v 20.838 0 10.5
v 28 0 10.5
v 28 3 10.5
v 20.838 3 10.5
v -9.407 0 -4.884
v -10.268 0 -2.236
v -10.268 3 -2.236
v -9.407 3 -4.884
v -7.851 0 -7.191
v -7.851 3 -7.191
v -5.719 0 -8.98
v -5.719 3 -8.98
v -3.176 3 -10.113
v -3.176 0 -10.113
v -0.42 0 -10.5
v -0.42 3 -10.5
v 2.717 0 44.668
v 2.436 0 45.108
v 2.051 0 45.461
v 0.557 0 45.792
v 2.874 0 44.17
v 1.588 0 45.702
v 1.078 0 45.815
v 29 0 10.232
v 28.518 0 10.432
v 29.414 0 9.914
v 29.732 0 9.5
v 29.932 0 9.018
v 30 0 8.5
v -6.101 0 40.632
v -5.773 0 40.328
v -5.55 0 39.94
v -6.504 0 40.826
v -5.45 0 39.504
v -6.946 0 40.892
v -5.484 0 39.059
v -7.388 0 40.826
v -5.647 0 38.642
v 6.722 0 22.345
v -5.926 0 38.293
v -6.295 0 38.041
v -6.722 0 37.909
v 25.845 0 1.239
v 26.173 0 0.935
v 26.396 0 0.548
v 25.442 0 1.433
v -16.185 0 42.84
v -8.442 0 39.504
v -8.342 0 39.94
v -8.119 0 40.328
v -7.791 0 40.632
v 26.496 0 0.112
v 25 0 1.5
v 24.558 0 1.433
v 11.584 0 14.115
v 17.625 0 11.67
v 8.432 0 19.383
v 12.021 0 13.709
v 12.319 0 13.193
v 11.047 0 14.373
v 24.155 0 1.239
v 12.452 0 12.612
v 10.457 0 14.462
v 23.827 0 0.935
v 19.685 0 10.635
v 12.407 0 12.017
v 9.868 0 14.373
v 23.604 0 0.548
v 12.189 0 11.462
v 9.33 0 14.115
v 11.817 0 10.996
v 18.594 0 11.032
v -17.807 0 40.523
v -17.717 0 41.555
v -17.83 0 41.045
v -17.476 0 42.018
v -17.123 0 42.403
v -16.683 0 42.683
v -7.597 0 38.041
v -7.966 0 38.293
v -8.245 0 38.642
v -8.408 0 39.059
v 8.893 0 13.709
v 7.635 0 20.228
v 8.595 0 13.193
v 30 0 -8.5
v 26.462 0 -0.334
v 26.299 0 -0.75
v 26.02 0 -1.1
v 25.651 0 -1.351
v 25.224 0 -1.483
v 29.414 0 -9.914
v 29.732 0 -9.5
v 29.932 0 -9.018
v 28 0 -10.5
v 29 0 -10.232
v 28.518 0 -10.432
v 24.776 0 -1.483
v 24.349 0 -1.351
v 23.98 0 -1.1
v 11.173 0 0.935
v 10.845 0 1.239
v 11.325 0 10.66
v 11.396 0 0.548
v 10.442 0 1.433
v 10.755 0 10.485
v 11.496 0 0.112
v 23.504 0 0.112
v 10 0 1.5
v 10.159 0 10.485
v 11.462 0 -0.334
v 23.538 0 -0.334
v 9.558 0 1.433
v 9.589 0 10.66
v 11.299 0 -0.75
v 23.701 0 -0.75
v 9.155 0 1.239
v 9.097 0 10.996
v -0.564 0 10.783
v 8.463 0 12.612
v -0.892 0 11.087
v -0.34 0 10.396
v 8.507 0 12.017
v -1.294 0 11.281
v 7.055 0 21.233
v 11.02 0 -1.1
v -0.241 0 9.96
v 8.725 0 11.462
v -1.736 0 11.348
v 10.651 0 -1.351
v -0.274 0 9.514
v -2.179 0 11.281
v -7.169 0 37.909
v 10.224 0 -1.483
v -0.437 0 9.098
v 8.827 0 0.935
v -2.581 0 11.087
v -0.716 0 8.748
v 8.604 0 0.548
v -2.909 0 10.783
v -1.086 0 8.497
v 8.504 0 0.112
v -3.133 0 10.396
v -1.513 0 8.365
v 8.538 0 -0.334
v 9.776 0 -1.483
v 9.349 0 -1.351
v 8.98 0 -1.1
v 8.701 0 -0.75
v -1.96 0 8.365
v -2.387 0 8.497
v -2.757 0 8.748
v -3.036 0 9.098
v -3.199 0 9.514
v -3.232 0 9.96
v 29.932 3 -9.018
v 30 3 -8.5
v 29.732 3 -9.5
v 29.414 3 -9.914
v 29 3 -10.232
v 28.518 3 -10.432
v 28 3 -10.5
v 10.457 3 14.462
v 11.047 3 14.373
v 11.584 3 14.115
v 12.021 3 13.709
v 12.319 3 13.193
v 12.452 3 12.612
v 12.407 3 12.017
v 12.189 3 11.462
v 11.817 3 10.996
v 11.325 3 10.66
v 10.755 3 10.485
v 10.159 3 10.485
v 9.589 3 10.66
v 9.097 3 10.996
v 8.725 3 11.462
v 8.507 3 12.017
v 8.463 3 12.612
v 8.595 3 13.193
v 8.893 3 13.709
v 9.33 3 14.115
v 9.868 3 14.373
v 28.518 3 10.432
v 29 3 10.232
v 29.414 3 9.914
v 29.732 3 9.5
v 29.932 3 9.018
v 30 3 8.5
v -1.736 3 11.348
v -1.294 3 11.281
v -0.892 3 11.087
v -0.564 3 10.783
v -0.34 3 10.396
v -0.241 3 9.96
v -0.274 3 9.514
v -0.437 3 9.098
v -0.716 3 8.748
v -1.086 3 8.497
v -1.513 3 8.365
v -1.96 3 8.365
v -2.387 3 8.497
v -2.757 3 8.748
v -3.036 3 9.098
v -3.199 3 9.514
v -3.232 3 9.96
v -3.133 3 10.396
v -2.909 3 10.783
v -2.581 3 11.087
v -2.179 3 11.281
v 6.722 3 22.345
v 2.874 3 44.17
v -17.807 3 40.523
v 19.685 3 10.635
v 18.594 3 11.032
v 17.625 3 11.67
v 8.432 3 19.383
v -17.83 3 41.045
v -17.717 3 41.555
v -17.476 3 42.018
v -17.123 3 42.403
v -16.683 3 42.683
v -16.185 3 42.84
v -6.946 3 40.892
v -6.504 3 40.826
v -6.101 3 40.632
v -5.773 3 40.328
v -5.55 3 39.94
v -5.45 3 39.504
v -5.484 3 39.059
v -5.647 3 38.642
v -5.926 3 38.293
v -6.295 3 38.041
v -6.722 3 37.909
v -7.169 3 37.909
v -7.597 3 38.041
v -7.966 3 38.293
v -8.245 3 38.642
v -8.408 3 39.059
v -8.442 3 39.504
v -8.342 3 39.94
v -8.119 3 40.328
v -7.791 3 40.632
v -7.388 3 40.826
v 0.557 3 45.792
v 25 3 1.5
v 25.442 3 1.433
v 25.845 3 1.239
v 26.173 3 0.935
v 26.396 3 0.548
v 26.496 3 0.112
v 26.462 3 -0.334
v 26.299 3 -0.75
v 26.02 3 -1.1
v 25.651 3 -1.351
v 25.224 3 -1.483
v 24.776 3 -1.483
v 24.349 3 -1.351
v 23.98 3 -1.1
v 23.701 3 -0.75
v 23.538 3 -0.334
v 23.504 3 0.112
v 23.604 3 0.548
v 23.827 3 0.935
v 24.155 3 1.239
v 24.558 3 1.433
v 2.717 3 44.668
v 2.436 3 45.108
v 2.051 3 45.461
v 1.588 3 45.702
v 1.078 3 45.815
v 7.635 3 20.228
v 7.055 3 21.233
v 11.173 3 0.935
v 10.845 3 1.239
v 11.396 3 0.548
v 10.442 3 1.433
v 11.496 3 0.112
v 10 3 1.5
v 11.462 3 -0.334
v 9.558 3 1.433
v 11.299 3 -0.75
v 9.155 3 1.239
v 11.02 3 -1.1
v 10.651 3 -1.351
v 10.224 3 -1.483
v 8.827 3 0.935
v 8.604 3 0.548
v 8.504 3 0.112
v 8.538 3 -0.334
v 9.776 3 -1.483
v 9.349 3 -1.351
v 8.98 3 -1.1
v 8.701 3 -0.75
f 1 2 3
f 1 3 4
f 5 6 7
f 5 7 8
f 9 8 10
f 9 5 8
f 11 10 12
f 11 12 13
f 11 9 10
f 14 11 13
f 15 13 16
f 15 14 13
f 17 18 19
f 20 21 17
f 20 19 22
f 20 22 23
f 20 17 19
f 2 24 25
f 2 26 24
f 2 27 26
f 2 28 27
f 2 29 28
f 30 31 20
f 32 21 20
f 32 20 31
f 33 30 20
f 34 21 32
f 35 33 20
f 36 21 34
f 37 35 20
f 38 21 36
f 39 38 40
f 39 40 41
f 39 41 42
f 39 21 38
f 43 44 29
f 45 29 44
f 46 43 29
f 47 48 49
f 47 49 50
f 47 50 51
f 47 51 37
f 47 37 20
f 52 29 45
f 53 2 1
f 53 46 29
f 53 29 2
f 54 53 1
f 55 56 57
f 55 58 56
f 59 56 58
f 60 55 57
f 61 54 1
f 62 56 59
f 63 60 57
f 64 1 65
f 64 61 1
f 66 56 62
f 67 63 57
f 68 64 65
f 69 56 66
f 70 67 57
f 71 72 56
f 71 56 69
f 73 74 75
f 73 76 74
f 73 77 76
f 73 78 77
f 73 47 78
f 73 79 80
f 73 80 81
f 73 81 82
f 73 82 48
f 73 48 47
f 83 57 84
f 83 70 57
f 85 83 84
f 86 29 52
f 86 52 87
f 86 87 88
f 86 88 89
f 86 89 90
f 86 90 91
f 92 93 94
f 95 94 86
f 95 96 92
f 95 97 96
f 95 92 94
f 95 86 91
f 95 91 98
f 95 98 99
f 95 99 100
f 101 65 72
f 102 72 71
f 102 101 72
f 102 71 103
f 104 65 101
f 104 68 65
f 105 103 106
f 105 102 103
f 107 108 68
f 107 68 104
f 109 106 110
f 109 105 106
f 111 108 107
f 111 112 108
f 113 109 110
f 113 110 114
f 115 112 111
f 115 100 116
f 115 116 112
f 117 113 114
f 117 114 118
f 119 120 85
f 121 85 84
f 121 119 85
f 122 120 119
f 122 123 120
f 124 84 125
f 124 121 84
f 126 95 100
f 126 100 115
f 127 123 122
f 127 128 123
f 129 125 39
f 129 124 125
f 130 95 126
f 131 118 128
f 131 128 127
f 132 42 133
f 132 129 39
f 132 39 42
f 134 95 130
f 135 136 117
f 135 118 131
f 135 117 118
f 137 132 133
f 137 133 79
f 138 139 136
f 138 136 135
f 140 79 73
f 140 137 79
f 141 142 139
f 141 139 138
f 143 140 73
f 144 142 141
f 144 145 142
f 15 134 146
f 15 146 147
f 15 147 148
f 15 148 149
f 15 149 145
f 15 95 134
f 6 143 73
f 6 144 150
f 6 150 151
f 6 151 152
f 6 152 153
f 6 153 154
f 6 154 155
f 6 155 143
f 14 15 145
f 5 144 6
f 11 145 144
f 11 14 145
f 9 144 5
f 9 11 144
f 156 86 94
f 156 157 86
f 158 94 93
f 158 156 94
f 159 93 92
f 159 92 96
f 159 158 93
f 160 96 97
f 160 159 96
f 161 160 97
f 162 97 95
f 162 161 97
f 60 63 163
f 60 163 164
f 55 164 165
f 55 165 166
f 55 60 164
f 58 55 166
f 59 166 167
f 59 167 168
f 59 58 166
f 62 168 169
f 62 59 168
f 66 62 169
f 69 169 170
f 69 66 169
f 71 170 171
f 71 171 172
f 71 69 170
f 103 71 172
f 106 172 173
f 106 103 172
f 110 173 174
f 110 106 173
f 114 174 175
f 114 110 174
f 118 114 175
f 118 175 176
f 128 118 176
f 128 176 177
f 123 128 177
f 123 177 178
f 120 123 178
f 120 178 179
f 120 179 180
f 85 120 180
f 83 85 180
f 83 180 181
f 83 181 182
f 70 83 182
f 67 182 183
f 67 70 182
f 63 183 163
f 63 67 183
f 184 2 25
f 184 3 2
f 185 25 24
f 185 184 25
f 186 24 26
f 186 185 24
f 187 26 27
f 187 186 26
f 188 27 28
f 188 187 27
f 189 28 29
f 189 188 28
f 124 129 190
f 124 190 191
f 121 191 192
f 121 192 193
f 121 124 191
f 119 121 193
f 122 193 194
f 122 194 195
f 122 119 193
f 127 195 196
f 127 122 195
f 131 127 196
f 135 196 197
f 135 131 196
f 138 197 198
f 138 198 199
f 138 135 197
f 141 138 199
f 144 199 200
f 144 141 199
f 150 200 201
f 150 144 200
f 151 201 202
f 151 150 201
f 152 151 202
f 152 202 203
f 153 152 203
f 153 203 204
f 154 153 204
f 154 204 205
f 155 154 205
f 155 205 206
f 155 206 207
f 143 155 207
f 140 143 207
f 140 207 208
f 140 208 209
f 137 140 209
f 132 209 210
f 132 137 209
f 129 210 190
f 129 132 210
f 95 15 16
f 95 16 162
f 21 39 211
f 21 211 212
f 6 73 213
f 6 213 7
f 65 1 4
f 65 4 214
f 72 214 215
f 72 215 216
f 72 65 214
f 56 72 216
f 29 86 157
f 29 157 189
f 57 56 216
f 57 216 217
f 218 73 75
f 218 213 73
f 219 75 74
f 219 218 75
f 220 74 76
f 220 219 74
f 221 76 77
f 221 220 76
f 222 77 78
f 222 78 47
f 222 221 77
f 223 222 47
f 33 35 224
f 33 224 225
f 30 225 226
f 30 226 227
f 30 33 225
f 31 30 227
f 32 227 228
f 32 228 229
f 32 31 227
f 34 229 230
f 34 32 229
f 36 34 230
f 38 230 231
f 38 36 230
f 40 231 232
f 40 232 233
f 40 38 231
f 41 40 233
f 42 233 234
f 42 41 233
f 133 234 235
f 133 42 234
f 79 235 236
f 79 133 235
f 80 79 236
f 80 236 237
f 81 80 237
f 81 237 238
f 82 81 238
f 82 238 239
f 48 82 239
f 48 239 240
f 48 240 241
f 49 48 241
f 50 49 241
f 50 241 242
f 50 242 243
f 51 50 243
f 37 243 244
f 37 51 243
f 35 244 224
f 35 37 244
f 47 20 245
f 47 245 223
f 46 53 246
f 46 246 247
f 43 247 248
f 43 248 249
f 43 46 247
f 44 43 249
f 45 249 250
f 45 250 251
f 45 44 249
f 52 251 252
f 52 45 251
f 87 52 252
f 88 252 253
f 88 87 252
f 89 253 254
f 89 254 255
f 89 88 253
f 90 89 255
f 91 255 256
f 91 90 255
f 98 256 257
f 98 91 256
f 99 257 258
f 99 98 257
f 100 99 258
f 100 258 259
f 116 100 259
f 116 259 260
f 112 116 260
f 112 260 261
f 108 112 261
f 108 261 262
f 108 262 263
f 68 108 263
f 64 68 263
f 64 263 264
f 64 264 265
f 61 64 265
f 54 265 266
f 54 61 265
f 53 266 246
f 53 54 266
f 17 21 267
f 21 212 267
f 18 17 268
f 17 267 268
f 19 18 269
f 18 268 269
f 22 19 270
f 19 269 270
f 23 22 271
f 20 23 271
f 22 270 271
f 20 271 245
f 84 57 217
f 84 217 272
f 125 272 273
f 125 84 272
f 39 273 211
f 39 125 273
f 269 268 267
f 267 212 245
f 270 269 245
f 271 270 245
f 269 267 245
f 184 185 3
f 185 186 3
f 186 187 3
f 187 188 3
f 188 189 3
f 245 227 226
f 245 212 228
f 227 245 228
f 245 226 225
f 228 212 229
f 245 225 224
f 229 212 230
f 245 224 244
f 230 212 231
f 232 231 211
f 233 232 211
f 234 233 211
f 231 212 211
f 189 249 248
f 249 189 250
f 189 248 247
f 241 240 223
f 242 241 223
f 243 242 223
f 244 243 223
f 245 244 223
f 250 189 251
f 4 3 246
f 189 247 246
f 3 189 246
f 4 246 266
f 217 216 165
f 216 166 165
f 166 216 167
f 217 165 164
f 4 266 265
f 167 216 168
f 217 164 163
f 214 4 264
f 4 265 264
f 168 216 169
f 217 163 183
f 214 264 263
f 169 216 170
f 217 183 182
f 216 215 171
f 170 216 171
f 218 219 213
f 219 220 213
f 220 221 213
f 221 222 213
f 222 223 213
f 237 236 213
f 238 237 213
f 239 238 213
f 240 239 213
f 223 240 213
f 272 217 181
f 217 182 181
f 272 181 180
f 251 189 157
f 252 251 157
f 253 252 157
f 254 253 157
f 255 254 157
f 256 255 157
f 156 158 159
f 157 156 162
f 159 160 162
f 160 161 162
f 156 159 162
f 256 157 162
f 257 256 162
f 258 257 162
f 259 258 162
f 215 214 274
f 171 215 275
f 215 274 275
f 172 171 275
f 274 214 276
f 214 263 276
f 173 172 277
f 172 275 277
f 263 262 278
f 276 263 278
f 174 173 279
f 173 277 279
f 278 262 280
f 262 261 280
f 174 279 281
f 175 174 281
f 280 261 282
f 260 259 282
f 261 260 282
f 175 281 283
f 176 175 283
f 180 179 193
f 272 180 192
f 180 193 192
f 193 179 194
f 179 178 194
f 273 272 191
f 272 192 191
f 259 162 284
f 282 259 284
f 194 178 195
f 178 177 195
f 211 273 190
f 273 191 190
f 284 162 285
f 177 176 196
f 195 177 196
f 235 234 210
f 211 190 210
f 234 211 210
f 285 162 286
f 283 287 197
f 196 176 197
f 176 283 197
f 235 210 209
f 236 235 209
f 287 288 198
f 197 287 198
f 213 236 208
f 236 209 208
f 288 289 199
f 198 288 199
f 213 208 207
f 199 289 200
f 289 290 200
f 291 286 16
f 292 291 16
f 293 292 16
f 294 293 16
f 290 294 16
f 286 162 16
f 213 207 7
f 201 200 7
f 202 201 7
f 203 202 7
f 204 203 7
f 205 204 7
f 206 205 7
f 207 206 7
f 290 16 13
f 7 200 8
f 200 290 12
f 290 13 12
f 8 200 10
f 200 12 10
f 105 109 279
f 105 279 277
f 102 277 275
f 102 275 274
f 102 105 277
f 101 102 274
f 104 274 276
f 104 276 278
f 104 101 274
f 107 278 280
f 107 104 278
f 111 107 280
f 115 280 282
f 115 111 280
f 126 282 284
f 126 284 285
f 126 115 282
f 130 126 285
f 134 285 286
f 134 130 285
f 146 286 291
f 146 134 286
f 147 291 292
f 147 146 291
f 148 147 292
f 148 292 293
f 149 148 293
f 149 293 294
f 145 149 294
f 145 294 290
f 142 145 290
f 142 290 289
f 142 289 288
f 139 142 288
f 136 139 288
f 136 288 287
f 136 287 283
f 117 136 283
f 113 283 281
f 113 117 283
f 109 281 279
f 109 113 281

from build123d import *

# Parameters (mm, degrees)
SKETCH_1_R      = 1.5
SKETCH_1_R_2    = 2
EXTRUDE_1_DEPTH = 3
FILLET_1_R      = 2


with BuildPart() as part:
    # 草图1 → 凸台-拉伸1 (new body)
    with BuildSketch(Plane(origin=(0, 0, 0), x_dir=(1, 0, 0), z_dir=(0, 1, 0))):
        with BuildLine():
            Line((30, -10.5), (20.838488019, -10.5))
            ThreePointArc((20.838488019, -10.5), (19.128387303, -10.801536896), (17.624549971, -11.669777784))
            Line((17.624549971, -11.669777784), (8.432016653, -19.383229101))
            ThreePointArc((8.432016653, -19.383229101), (7.315827683, -20.713451316), (6.721915937, -22.345210428))
            Line((6.721915937, -22.345210428), (2.526313412, -46.139654751))
            Line((2.526313412, -46.139654751), (-18.154649402, -42.49304302))
            Line((-18.154649402, -42.49304302), (-10.267627346, 2.236481777))
            ThreePointArc((-10.267627346, 2.236481777), (-6.847425912, 8.160444431), (-0.419549816, 10.5))
            Line((-0.419549816, 10.5), (30, 10.5))
            Line((30, 10.5), (30, -10.5))
        make_face()
        with Locations(Location((25, 0, 0), (0, 0, 270))):
            Circle(SKETCH_1_R, mode=Mode.SUBTRACT)
        with Locations(Location((10, 0, 0), (0, 0, 270))):
            Circle(SKETCH_1_R, mode=Mode.SUBTRACT)
        with Locations(Location((-6.945927107, -39.39231012, 0), (0, 0, 270))):
            Circle(SKETCH_1_R, mode=Mode.SUBTRACT)
        with Locations(Location((-1.736481777, -9.84807753, 0), (0, 0, 270))):
            Circle(SKETCH_1_R, mode=Mode.SUBTRACT)
        with Locations(Location((10.457132873, -12.46232567, 0), (0, 0, 270))):
            Circle(SKETCH_1_R_2, mode=Mode.SUBTRACT)
    extrude(amount=EXTRUDE_1_DEPTH)

    # 圆角1
    fillet_1_edges = [part.edges().sort_by_distance(p)[0] for p in [
        (2.526313412, 1.5, 46.139654751),
        (-18.154649402, 1.5, 42.49304302),
        (30, 1.5, -10.5),
        (30, 1.5, 10.5),
    ]]
    fillet(fillet_1_edges, radius=FILLET_1_R)


solid = part.part
